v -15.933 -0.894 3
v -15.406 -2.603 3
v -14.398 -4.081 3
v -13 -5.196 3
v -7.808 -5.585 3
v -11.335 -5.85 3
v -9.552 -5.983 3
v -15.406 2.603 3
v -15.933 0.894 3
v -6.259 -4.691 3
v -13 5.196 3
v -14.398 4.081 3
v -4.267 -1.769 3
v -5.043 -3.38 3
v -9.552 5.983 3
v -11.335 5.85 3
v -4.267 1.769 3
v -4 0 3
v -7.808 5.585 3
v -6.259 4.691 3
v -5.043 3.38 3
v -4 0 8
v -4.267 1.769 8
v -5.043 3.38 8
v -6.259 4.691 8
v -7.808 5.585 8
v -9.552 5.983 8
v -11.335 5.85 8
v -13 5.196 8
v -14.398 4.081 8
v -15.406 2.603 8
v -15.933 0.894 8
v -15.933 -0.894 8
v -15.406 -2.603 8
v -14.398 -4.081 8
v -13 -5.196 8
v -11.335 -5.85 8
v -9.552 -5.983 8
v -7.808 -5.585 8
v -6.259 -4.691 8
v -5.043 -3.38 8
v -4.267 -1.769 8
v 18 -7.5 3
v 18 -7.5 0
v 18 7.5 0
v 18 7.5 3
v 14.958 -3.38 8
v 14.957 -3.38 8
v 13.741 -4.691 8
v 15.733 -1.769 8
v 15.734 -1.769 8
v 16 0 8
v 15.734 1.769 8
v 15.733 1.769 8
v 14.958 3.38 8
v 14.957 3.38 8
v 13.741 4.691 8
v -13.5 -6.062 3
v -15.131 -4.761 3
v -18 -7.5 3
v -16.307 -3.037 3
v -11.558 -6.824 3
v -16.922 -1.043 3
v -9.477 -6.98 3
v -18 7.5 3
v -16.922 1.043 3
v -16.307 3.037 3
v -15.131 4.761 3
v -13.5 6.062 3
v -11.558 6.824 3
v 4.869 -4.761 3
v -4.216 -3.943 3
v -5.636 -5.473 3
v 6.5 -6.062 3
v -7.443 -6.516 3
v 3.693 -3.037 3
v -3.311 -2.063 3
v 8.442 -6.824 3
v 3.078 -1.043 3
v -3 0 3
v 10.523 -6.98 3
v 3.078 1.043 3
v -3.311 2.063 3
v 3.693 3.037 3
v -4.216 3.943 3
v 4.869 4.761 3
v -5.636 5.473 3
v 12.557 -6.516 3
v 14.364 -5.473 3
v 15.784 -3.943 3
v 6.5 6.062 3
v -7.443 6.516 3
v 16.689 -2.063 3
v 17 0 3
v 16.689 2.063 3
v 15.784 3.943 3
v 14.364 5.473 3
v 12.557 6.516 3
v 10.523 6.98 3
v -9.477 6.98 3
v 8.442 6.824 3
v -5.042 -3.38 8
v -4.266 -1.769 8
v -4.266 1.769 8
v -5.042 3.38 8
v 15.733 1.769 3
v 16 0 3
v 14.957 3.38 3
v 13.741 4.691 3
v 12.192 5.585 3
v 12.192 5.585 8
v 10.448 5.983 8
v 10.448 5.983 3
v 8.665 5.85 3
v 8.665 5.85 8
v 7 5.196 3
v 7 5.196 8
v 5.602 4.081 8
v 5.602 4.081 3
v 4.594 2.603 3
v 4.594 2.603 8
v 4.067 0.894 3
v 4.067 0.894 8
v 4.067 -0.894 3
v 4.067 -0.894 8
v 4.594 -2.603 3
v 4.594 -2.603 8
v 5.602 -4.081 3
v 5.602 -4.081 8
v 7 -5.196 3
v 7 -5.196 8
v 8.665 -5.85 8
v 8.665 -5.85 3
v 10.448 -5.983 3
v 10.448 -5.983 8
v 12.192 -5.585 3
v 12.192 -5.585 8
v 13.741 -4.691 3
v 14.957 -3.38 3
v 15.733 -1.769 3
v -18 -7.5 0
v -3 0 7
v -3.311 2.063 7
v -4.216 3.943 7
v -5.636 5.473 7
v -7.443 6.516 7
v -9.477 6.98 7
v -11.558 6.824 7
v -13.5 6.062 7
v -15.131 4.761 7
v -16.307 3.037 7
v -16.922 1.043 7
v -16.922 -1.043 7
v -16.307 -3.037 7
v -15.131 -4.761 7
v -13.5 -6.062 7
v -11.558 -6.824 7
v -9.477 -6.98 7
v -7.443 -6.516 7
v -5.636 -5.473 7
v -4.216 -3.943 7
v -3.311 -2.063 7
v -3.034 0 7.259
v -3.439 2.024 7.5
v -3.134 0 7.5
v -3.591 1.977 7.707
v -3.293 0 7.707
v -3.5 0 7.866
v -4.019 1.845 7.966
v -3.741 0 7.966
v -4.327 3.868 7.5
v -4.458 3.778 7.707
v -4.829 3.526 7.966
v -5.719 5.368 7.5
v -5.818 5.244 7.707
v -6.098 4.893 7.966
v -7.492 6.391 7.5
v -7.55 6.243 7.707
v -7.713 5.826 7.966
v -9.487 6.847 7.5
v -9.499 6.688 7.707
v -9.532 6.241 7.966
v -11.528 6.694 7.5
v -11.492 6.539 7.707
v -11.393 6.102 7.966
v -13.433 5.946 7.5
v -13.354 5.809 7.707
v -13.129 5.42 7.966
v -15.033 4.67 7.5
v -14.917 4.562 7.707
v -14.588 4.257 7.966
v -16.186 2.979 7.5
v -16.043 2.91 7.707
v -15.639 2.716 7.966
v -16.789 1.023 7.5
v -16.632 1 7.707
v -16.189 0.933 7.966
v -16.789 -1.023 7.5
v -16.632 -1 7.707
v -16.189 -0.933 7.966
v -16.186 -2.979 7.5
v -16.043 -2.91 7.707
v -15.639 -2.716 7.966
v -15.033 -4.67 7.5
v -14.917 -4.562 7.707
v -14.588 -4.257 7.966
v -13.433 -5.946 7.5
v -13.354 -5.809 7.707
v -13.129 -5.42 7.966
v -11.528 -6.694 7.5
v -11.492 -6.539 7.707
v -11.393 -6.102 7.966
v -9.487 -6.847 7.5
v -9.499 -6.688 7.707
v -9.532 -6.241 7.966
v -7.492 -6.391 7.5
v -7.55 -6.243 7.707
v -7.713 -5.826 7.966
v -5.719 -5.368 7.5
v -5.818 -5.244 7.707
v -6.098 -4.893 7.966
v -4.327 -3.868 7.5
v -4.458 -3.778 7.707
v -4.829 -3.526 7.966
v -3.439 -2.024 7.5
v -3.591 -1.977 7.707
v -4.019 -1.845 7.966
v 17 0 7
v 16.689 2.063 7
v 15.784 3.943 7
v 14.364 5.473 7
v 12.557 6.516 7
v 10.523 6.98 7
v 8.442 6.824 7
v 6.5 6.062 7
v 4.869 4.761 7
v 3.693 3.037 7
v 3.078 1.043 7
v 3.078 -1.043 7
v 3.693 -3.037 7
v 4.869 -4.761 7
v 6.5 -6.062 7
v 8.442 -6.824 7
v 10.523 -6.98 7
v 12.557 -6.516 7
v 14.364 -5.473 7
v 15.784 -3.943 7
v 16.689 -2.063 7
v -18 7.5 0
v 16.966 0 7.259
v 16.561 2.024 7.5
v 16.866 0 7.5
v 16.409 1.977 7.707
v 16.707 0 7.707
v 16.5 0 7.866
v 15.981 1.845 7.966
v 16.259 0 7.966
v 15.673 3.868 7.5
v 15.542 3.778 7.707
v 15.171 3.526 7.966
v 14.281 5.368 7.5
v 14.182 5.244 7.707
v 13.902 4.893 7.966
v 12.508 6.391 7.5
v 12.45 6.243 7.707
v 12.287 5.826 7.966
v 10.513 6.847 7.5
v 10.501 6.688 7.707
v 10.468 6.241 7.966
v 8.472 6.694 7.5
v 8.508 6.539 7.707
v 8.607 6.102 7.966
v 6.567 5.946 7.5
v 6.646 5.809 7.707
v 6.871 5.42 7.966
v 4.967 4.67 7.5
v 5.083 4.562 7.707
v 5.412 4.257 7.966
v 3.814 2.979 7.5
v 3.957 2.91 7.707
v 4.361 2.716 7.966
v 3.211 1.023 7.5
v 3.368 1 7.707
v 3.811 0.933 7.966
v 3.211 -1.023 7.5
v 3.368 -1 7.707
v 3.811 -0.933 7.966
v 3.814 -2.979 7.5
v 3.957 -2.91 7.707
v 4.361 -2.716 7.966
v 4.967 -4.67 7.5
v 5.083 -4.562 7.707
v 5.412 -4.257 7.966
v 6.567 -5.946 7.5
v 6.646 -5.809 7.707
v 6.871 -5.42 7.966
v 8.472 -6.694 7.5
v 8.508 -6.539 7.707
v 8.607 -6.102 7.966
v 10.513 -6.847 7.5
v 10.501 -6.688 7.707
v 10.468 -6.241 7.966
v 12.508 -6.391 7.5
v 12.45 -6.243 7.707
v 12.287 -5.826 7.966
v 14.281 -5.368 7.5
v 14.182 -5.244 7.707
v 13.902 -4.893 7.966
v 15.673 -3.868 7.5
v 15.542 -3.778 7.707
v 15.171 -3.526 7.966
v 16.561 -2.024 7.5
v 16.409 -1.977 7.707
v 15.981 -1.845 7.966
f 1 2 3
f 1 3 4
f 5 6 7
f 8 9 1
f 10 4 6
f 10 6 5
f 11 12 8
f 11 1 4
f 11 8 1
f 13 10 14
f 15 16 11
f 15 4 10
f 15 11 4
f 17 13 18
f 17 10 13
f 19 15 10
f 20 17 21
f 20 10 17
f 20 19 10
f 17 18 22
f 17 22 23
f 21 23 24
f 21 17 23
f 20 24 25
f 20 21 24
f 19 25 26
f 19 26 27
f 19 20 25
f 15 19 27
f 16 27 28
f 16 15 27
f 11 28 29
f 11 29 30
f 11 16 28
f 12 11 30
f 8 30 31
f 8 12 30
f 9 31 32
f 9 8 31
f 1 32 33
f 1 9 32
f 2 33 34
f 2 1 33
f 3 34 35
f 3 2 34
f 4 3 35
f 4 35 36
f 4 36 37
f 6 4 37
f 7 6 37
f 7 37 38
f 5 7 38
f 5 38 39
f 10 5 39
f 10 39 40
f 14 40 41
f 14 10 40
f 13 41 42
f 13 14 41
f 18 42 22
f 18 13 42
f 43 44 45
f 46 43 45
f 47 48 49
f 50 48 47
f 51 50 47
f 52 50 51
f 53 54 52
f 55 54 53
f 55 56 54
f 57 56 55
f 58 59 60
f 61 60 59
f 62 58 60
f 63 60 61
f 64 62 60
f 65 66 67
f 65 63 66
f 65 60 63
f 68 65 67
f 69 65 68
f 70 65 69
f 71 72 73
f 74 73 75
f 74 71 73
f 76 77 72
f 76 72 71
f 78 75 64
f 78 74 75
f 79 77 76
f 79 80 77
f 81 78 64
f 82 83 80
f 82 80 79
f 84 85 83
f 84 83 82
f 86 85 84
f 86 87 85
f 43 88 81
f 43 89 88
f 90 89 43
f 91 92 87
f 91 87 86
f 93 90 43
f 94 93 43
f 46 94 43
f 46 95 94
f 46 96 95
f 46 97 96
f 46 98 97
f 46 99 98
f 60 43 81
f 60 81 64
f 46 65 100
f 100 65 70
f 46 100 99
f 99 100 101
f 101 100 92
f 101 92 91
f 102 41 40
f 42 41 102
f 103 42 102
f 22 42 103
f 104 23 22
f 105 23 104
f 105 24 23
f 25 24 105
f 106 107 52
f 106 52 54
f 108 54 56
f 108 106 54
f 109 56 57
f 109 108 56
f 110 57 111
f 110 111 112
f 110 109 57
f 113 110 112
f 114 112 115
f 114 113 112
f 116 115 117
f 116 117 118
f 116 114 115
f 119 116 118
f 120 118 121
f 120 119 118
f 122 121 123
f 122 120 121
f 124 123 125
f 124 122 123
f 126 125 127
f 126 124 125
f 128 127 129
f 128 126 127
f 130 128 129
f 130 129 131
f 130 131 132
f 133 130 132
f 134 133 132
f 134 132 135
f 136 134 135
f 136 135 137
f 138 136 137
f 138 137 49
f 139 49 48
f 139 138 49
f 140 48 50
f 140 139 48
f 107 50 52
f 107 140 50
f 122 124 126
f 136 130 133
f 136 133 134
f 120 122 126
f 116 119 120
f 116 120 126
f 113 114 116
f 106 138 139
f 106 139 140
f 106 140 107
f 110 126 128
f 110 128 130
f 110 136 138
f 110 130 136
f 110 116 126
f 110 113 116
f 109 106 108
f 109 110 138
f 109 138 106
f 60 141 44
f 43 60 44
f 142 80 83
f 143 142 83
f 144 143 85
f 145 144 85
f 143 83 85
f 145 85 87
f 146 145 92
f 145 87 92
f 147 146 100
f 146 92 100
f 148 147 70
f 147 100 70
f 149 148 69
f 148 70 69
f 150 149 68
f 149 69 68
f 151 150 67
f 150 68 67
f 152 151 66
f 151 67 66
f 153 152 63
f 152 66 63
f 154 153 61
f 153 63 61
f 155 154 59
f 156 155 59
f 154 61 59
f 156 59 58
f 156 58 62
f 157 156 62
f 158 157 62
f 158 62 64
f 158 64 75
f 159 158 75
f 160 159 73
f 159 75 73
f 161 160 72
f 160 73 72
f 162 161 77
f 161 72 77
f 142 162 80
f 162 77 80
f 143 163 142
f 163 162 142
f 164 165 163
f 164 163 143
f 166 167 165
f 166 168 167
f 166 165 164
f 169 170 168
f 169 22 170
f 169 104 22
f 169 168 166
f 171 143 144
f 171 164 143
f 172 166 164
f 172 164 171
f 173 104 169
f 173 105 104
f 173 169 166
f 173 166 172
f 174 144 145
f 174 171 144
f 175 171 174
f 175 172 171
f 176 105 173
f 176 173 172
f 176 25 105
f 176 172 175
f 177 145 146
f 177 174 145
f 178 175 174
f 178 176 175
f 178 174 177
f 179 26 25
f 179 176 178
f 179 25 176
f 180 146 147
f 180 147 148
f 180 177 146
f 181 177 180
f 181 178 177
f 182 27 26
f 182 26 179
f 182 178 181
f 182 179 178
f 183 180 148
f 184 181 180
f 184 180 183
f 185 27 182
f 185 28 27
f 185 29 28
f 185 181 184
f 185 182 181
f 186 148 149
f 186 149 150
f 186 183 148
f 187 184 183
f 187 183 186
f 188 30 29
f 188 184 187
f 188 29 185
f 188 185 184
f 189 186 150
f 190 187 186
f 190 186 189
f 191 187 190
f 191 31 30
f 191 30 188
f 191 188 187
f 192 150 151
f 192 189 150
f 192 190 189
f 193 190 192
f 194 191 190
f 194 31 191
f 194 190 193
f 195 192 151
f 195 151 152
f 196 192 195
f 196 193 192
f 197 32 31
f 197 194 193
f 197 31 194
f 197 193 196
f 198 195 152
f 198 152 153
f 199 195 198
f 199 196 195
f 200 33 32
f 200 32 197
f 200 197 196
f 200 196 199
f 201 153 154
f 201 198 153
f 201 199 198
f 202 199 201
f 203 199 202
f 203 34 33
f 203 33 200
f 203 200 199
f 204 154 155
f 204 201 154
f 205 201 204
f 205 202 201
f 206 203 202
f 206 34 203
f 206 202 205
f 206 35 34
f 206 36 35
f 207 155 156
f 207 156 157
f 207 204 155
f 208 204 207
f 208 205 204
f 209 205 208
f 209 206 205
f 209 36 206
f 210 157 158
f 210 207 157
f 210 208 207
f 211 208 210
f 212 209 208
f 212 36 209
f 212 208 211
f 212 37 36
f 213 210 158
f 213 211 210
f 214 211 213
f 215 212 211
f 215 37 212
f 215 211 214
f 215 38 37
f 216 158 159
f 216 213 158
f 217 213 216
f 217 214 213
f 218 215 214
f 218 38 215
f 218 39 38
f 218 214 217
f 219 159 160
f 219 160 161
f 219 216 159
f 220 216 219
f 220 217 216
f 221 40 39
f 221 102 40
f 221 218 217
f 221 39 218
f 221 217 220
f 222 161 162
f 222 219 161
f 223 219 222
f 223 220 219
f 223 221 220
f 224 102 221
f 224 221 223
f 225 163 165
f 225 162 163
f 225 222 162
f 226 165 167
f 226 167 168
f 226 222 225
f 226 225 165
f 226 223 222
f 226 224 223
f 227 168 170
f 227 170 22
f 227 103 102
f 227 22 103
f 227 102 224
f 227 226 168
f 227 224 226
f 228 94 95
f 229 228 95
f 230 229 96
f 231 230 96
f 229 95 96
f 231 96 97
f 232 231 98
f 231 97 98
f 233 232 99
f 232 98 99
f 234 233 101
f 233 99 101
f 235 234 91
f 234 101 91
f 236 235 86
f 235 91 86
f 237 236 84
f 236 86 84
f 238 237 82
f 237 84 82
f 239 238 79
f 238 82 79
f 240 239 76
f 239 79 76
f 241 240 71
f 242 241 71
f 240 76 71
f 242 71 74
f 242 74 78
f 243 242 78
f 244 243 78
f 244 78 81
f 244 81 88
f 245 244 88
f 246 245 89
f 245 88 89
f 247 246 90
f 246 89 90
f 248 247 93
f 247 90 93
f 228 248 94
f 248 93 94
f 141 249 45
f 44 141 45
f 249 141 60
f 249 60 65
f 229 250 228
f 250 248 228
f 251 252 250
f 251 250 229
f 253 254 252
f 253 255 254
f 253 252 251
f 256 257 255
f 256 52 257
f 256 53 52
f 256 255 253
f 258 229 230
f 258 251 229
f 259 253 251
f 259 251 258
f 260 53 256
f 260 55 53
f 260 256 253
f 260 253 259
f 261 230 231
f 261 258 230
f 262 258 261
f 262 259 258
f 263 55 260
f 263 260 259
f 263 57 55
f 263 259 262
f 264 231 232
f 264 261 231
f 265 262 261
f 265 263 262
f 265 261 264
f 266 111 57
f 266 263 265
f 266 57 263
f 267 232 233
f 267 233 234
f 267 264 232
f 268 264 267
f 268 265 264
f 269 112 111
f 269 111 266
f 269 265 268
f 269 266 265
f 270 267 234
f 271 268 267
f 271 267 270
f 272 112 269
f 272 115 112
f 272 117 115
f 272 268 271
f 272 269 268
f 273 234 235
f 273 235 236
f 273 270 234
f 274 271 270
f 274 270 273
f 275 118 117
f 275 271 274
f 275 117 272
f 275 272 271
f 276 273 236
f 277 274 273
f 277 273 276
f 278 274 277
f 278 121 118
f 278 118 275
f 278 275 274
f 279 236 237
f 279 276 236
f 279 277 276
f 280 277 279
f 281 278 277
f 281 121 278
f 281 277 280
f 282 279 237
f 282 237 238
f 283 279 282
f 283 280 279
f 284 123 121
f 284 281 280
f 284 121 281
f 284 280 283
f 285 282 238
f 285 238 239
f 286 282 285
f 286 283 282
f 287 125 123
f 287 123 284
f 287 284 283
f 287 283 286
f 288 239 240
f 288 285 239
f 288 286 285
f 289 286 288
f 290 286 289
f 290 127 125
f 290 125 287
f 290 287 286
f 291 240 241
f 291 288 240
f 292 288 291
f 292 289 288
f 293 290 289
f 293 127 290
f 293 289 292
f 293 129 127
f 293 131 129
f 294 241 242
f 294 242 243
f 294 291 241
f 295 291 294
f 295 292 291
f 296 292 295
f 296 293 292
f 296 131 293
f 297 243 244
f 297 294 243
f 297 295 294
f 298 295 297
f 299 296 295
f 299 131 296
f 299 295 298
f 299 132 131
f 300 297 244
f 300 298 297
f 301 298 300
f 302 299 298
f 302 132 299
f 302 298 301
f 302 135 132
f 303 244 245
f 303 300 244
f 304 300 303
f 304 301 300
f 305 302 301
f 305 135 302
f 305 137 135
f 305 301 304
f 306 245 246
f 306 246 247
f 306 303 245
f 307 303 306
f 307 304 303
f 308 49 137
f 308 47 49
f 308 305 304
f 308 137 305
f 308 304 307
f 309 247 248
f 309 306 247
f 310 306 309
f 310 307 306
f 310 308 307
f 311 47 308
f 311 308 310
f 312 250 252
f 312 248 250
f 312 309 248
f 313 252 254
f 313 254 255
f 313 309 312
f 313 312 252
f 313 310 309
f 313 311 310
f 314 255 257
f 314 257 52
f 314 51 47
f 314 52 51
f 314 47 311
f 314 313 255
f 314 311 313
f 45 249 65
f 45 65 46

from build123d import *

# Parameters (mm, degrees)
SKETCH1_W           = 36
SKETCH1_H           = 15
BOSS_EXTRUDE1_DEPTH = 3
SKETCH2_R           = 7
SKETCH2_R_2         = 6
BOSS_EXTRUDE2_DEPTH = 5
FILLET1_R           = 1


with BuildPart() as part:
    # Sketch1 → Boss-Extrude1 (new body)
    with BuildSketch(Plane.XY):
        Rectangle(SKETCH1_W, SKETCH1_H)
    extrude(amount=BOSS_EXTRUDE1_DEPTH)

    # Sketch2 → Boss-Extrude2 (add)
    # profile 1 of 2: a face of its own
    with BuildSketch(Plane.XY.offset(3)):
        with Locations((-10, 0)):
            Circle(SKETCH2_R)
        with Locations((-10, 0)):
            Circle(SKETCH2_R_2, mode=Mode.SUBTRACT)
    # profile 2 of 2: a face of its own
    with BuildSketch(Plane.XY.offset(3)):
        with Locations((10, 0)):
            Circle(SKETCH2_R)
        with Locations((10, 0)):
            Circle(SKETCH2_R_2, mode=Mode.SUBTRACT)
    extrude(amount=BOSS_EXTRUDE2_DEPTH)

    # Fillet1
    fillet1_edges = [part.edges().sort_by_distance(p)[0] for p in [
        (-17, 0, 8),
        (3, 0, 8),
    ]]
    fillet(fillet1_edges, radius=FILLET1_R - 0.0001)  # a hair under: the kernel refuses the full size


solid = part.part
